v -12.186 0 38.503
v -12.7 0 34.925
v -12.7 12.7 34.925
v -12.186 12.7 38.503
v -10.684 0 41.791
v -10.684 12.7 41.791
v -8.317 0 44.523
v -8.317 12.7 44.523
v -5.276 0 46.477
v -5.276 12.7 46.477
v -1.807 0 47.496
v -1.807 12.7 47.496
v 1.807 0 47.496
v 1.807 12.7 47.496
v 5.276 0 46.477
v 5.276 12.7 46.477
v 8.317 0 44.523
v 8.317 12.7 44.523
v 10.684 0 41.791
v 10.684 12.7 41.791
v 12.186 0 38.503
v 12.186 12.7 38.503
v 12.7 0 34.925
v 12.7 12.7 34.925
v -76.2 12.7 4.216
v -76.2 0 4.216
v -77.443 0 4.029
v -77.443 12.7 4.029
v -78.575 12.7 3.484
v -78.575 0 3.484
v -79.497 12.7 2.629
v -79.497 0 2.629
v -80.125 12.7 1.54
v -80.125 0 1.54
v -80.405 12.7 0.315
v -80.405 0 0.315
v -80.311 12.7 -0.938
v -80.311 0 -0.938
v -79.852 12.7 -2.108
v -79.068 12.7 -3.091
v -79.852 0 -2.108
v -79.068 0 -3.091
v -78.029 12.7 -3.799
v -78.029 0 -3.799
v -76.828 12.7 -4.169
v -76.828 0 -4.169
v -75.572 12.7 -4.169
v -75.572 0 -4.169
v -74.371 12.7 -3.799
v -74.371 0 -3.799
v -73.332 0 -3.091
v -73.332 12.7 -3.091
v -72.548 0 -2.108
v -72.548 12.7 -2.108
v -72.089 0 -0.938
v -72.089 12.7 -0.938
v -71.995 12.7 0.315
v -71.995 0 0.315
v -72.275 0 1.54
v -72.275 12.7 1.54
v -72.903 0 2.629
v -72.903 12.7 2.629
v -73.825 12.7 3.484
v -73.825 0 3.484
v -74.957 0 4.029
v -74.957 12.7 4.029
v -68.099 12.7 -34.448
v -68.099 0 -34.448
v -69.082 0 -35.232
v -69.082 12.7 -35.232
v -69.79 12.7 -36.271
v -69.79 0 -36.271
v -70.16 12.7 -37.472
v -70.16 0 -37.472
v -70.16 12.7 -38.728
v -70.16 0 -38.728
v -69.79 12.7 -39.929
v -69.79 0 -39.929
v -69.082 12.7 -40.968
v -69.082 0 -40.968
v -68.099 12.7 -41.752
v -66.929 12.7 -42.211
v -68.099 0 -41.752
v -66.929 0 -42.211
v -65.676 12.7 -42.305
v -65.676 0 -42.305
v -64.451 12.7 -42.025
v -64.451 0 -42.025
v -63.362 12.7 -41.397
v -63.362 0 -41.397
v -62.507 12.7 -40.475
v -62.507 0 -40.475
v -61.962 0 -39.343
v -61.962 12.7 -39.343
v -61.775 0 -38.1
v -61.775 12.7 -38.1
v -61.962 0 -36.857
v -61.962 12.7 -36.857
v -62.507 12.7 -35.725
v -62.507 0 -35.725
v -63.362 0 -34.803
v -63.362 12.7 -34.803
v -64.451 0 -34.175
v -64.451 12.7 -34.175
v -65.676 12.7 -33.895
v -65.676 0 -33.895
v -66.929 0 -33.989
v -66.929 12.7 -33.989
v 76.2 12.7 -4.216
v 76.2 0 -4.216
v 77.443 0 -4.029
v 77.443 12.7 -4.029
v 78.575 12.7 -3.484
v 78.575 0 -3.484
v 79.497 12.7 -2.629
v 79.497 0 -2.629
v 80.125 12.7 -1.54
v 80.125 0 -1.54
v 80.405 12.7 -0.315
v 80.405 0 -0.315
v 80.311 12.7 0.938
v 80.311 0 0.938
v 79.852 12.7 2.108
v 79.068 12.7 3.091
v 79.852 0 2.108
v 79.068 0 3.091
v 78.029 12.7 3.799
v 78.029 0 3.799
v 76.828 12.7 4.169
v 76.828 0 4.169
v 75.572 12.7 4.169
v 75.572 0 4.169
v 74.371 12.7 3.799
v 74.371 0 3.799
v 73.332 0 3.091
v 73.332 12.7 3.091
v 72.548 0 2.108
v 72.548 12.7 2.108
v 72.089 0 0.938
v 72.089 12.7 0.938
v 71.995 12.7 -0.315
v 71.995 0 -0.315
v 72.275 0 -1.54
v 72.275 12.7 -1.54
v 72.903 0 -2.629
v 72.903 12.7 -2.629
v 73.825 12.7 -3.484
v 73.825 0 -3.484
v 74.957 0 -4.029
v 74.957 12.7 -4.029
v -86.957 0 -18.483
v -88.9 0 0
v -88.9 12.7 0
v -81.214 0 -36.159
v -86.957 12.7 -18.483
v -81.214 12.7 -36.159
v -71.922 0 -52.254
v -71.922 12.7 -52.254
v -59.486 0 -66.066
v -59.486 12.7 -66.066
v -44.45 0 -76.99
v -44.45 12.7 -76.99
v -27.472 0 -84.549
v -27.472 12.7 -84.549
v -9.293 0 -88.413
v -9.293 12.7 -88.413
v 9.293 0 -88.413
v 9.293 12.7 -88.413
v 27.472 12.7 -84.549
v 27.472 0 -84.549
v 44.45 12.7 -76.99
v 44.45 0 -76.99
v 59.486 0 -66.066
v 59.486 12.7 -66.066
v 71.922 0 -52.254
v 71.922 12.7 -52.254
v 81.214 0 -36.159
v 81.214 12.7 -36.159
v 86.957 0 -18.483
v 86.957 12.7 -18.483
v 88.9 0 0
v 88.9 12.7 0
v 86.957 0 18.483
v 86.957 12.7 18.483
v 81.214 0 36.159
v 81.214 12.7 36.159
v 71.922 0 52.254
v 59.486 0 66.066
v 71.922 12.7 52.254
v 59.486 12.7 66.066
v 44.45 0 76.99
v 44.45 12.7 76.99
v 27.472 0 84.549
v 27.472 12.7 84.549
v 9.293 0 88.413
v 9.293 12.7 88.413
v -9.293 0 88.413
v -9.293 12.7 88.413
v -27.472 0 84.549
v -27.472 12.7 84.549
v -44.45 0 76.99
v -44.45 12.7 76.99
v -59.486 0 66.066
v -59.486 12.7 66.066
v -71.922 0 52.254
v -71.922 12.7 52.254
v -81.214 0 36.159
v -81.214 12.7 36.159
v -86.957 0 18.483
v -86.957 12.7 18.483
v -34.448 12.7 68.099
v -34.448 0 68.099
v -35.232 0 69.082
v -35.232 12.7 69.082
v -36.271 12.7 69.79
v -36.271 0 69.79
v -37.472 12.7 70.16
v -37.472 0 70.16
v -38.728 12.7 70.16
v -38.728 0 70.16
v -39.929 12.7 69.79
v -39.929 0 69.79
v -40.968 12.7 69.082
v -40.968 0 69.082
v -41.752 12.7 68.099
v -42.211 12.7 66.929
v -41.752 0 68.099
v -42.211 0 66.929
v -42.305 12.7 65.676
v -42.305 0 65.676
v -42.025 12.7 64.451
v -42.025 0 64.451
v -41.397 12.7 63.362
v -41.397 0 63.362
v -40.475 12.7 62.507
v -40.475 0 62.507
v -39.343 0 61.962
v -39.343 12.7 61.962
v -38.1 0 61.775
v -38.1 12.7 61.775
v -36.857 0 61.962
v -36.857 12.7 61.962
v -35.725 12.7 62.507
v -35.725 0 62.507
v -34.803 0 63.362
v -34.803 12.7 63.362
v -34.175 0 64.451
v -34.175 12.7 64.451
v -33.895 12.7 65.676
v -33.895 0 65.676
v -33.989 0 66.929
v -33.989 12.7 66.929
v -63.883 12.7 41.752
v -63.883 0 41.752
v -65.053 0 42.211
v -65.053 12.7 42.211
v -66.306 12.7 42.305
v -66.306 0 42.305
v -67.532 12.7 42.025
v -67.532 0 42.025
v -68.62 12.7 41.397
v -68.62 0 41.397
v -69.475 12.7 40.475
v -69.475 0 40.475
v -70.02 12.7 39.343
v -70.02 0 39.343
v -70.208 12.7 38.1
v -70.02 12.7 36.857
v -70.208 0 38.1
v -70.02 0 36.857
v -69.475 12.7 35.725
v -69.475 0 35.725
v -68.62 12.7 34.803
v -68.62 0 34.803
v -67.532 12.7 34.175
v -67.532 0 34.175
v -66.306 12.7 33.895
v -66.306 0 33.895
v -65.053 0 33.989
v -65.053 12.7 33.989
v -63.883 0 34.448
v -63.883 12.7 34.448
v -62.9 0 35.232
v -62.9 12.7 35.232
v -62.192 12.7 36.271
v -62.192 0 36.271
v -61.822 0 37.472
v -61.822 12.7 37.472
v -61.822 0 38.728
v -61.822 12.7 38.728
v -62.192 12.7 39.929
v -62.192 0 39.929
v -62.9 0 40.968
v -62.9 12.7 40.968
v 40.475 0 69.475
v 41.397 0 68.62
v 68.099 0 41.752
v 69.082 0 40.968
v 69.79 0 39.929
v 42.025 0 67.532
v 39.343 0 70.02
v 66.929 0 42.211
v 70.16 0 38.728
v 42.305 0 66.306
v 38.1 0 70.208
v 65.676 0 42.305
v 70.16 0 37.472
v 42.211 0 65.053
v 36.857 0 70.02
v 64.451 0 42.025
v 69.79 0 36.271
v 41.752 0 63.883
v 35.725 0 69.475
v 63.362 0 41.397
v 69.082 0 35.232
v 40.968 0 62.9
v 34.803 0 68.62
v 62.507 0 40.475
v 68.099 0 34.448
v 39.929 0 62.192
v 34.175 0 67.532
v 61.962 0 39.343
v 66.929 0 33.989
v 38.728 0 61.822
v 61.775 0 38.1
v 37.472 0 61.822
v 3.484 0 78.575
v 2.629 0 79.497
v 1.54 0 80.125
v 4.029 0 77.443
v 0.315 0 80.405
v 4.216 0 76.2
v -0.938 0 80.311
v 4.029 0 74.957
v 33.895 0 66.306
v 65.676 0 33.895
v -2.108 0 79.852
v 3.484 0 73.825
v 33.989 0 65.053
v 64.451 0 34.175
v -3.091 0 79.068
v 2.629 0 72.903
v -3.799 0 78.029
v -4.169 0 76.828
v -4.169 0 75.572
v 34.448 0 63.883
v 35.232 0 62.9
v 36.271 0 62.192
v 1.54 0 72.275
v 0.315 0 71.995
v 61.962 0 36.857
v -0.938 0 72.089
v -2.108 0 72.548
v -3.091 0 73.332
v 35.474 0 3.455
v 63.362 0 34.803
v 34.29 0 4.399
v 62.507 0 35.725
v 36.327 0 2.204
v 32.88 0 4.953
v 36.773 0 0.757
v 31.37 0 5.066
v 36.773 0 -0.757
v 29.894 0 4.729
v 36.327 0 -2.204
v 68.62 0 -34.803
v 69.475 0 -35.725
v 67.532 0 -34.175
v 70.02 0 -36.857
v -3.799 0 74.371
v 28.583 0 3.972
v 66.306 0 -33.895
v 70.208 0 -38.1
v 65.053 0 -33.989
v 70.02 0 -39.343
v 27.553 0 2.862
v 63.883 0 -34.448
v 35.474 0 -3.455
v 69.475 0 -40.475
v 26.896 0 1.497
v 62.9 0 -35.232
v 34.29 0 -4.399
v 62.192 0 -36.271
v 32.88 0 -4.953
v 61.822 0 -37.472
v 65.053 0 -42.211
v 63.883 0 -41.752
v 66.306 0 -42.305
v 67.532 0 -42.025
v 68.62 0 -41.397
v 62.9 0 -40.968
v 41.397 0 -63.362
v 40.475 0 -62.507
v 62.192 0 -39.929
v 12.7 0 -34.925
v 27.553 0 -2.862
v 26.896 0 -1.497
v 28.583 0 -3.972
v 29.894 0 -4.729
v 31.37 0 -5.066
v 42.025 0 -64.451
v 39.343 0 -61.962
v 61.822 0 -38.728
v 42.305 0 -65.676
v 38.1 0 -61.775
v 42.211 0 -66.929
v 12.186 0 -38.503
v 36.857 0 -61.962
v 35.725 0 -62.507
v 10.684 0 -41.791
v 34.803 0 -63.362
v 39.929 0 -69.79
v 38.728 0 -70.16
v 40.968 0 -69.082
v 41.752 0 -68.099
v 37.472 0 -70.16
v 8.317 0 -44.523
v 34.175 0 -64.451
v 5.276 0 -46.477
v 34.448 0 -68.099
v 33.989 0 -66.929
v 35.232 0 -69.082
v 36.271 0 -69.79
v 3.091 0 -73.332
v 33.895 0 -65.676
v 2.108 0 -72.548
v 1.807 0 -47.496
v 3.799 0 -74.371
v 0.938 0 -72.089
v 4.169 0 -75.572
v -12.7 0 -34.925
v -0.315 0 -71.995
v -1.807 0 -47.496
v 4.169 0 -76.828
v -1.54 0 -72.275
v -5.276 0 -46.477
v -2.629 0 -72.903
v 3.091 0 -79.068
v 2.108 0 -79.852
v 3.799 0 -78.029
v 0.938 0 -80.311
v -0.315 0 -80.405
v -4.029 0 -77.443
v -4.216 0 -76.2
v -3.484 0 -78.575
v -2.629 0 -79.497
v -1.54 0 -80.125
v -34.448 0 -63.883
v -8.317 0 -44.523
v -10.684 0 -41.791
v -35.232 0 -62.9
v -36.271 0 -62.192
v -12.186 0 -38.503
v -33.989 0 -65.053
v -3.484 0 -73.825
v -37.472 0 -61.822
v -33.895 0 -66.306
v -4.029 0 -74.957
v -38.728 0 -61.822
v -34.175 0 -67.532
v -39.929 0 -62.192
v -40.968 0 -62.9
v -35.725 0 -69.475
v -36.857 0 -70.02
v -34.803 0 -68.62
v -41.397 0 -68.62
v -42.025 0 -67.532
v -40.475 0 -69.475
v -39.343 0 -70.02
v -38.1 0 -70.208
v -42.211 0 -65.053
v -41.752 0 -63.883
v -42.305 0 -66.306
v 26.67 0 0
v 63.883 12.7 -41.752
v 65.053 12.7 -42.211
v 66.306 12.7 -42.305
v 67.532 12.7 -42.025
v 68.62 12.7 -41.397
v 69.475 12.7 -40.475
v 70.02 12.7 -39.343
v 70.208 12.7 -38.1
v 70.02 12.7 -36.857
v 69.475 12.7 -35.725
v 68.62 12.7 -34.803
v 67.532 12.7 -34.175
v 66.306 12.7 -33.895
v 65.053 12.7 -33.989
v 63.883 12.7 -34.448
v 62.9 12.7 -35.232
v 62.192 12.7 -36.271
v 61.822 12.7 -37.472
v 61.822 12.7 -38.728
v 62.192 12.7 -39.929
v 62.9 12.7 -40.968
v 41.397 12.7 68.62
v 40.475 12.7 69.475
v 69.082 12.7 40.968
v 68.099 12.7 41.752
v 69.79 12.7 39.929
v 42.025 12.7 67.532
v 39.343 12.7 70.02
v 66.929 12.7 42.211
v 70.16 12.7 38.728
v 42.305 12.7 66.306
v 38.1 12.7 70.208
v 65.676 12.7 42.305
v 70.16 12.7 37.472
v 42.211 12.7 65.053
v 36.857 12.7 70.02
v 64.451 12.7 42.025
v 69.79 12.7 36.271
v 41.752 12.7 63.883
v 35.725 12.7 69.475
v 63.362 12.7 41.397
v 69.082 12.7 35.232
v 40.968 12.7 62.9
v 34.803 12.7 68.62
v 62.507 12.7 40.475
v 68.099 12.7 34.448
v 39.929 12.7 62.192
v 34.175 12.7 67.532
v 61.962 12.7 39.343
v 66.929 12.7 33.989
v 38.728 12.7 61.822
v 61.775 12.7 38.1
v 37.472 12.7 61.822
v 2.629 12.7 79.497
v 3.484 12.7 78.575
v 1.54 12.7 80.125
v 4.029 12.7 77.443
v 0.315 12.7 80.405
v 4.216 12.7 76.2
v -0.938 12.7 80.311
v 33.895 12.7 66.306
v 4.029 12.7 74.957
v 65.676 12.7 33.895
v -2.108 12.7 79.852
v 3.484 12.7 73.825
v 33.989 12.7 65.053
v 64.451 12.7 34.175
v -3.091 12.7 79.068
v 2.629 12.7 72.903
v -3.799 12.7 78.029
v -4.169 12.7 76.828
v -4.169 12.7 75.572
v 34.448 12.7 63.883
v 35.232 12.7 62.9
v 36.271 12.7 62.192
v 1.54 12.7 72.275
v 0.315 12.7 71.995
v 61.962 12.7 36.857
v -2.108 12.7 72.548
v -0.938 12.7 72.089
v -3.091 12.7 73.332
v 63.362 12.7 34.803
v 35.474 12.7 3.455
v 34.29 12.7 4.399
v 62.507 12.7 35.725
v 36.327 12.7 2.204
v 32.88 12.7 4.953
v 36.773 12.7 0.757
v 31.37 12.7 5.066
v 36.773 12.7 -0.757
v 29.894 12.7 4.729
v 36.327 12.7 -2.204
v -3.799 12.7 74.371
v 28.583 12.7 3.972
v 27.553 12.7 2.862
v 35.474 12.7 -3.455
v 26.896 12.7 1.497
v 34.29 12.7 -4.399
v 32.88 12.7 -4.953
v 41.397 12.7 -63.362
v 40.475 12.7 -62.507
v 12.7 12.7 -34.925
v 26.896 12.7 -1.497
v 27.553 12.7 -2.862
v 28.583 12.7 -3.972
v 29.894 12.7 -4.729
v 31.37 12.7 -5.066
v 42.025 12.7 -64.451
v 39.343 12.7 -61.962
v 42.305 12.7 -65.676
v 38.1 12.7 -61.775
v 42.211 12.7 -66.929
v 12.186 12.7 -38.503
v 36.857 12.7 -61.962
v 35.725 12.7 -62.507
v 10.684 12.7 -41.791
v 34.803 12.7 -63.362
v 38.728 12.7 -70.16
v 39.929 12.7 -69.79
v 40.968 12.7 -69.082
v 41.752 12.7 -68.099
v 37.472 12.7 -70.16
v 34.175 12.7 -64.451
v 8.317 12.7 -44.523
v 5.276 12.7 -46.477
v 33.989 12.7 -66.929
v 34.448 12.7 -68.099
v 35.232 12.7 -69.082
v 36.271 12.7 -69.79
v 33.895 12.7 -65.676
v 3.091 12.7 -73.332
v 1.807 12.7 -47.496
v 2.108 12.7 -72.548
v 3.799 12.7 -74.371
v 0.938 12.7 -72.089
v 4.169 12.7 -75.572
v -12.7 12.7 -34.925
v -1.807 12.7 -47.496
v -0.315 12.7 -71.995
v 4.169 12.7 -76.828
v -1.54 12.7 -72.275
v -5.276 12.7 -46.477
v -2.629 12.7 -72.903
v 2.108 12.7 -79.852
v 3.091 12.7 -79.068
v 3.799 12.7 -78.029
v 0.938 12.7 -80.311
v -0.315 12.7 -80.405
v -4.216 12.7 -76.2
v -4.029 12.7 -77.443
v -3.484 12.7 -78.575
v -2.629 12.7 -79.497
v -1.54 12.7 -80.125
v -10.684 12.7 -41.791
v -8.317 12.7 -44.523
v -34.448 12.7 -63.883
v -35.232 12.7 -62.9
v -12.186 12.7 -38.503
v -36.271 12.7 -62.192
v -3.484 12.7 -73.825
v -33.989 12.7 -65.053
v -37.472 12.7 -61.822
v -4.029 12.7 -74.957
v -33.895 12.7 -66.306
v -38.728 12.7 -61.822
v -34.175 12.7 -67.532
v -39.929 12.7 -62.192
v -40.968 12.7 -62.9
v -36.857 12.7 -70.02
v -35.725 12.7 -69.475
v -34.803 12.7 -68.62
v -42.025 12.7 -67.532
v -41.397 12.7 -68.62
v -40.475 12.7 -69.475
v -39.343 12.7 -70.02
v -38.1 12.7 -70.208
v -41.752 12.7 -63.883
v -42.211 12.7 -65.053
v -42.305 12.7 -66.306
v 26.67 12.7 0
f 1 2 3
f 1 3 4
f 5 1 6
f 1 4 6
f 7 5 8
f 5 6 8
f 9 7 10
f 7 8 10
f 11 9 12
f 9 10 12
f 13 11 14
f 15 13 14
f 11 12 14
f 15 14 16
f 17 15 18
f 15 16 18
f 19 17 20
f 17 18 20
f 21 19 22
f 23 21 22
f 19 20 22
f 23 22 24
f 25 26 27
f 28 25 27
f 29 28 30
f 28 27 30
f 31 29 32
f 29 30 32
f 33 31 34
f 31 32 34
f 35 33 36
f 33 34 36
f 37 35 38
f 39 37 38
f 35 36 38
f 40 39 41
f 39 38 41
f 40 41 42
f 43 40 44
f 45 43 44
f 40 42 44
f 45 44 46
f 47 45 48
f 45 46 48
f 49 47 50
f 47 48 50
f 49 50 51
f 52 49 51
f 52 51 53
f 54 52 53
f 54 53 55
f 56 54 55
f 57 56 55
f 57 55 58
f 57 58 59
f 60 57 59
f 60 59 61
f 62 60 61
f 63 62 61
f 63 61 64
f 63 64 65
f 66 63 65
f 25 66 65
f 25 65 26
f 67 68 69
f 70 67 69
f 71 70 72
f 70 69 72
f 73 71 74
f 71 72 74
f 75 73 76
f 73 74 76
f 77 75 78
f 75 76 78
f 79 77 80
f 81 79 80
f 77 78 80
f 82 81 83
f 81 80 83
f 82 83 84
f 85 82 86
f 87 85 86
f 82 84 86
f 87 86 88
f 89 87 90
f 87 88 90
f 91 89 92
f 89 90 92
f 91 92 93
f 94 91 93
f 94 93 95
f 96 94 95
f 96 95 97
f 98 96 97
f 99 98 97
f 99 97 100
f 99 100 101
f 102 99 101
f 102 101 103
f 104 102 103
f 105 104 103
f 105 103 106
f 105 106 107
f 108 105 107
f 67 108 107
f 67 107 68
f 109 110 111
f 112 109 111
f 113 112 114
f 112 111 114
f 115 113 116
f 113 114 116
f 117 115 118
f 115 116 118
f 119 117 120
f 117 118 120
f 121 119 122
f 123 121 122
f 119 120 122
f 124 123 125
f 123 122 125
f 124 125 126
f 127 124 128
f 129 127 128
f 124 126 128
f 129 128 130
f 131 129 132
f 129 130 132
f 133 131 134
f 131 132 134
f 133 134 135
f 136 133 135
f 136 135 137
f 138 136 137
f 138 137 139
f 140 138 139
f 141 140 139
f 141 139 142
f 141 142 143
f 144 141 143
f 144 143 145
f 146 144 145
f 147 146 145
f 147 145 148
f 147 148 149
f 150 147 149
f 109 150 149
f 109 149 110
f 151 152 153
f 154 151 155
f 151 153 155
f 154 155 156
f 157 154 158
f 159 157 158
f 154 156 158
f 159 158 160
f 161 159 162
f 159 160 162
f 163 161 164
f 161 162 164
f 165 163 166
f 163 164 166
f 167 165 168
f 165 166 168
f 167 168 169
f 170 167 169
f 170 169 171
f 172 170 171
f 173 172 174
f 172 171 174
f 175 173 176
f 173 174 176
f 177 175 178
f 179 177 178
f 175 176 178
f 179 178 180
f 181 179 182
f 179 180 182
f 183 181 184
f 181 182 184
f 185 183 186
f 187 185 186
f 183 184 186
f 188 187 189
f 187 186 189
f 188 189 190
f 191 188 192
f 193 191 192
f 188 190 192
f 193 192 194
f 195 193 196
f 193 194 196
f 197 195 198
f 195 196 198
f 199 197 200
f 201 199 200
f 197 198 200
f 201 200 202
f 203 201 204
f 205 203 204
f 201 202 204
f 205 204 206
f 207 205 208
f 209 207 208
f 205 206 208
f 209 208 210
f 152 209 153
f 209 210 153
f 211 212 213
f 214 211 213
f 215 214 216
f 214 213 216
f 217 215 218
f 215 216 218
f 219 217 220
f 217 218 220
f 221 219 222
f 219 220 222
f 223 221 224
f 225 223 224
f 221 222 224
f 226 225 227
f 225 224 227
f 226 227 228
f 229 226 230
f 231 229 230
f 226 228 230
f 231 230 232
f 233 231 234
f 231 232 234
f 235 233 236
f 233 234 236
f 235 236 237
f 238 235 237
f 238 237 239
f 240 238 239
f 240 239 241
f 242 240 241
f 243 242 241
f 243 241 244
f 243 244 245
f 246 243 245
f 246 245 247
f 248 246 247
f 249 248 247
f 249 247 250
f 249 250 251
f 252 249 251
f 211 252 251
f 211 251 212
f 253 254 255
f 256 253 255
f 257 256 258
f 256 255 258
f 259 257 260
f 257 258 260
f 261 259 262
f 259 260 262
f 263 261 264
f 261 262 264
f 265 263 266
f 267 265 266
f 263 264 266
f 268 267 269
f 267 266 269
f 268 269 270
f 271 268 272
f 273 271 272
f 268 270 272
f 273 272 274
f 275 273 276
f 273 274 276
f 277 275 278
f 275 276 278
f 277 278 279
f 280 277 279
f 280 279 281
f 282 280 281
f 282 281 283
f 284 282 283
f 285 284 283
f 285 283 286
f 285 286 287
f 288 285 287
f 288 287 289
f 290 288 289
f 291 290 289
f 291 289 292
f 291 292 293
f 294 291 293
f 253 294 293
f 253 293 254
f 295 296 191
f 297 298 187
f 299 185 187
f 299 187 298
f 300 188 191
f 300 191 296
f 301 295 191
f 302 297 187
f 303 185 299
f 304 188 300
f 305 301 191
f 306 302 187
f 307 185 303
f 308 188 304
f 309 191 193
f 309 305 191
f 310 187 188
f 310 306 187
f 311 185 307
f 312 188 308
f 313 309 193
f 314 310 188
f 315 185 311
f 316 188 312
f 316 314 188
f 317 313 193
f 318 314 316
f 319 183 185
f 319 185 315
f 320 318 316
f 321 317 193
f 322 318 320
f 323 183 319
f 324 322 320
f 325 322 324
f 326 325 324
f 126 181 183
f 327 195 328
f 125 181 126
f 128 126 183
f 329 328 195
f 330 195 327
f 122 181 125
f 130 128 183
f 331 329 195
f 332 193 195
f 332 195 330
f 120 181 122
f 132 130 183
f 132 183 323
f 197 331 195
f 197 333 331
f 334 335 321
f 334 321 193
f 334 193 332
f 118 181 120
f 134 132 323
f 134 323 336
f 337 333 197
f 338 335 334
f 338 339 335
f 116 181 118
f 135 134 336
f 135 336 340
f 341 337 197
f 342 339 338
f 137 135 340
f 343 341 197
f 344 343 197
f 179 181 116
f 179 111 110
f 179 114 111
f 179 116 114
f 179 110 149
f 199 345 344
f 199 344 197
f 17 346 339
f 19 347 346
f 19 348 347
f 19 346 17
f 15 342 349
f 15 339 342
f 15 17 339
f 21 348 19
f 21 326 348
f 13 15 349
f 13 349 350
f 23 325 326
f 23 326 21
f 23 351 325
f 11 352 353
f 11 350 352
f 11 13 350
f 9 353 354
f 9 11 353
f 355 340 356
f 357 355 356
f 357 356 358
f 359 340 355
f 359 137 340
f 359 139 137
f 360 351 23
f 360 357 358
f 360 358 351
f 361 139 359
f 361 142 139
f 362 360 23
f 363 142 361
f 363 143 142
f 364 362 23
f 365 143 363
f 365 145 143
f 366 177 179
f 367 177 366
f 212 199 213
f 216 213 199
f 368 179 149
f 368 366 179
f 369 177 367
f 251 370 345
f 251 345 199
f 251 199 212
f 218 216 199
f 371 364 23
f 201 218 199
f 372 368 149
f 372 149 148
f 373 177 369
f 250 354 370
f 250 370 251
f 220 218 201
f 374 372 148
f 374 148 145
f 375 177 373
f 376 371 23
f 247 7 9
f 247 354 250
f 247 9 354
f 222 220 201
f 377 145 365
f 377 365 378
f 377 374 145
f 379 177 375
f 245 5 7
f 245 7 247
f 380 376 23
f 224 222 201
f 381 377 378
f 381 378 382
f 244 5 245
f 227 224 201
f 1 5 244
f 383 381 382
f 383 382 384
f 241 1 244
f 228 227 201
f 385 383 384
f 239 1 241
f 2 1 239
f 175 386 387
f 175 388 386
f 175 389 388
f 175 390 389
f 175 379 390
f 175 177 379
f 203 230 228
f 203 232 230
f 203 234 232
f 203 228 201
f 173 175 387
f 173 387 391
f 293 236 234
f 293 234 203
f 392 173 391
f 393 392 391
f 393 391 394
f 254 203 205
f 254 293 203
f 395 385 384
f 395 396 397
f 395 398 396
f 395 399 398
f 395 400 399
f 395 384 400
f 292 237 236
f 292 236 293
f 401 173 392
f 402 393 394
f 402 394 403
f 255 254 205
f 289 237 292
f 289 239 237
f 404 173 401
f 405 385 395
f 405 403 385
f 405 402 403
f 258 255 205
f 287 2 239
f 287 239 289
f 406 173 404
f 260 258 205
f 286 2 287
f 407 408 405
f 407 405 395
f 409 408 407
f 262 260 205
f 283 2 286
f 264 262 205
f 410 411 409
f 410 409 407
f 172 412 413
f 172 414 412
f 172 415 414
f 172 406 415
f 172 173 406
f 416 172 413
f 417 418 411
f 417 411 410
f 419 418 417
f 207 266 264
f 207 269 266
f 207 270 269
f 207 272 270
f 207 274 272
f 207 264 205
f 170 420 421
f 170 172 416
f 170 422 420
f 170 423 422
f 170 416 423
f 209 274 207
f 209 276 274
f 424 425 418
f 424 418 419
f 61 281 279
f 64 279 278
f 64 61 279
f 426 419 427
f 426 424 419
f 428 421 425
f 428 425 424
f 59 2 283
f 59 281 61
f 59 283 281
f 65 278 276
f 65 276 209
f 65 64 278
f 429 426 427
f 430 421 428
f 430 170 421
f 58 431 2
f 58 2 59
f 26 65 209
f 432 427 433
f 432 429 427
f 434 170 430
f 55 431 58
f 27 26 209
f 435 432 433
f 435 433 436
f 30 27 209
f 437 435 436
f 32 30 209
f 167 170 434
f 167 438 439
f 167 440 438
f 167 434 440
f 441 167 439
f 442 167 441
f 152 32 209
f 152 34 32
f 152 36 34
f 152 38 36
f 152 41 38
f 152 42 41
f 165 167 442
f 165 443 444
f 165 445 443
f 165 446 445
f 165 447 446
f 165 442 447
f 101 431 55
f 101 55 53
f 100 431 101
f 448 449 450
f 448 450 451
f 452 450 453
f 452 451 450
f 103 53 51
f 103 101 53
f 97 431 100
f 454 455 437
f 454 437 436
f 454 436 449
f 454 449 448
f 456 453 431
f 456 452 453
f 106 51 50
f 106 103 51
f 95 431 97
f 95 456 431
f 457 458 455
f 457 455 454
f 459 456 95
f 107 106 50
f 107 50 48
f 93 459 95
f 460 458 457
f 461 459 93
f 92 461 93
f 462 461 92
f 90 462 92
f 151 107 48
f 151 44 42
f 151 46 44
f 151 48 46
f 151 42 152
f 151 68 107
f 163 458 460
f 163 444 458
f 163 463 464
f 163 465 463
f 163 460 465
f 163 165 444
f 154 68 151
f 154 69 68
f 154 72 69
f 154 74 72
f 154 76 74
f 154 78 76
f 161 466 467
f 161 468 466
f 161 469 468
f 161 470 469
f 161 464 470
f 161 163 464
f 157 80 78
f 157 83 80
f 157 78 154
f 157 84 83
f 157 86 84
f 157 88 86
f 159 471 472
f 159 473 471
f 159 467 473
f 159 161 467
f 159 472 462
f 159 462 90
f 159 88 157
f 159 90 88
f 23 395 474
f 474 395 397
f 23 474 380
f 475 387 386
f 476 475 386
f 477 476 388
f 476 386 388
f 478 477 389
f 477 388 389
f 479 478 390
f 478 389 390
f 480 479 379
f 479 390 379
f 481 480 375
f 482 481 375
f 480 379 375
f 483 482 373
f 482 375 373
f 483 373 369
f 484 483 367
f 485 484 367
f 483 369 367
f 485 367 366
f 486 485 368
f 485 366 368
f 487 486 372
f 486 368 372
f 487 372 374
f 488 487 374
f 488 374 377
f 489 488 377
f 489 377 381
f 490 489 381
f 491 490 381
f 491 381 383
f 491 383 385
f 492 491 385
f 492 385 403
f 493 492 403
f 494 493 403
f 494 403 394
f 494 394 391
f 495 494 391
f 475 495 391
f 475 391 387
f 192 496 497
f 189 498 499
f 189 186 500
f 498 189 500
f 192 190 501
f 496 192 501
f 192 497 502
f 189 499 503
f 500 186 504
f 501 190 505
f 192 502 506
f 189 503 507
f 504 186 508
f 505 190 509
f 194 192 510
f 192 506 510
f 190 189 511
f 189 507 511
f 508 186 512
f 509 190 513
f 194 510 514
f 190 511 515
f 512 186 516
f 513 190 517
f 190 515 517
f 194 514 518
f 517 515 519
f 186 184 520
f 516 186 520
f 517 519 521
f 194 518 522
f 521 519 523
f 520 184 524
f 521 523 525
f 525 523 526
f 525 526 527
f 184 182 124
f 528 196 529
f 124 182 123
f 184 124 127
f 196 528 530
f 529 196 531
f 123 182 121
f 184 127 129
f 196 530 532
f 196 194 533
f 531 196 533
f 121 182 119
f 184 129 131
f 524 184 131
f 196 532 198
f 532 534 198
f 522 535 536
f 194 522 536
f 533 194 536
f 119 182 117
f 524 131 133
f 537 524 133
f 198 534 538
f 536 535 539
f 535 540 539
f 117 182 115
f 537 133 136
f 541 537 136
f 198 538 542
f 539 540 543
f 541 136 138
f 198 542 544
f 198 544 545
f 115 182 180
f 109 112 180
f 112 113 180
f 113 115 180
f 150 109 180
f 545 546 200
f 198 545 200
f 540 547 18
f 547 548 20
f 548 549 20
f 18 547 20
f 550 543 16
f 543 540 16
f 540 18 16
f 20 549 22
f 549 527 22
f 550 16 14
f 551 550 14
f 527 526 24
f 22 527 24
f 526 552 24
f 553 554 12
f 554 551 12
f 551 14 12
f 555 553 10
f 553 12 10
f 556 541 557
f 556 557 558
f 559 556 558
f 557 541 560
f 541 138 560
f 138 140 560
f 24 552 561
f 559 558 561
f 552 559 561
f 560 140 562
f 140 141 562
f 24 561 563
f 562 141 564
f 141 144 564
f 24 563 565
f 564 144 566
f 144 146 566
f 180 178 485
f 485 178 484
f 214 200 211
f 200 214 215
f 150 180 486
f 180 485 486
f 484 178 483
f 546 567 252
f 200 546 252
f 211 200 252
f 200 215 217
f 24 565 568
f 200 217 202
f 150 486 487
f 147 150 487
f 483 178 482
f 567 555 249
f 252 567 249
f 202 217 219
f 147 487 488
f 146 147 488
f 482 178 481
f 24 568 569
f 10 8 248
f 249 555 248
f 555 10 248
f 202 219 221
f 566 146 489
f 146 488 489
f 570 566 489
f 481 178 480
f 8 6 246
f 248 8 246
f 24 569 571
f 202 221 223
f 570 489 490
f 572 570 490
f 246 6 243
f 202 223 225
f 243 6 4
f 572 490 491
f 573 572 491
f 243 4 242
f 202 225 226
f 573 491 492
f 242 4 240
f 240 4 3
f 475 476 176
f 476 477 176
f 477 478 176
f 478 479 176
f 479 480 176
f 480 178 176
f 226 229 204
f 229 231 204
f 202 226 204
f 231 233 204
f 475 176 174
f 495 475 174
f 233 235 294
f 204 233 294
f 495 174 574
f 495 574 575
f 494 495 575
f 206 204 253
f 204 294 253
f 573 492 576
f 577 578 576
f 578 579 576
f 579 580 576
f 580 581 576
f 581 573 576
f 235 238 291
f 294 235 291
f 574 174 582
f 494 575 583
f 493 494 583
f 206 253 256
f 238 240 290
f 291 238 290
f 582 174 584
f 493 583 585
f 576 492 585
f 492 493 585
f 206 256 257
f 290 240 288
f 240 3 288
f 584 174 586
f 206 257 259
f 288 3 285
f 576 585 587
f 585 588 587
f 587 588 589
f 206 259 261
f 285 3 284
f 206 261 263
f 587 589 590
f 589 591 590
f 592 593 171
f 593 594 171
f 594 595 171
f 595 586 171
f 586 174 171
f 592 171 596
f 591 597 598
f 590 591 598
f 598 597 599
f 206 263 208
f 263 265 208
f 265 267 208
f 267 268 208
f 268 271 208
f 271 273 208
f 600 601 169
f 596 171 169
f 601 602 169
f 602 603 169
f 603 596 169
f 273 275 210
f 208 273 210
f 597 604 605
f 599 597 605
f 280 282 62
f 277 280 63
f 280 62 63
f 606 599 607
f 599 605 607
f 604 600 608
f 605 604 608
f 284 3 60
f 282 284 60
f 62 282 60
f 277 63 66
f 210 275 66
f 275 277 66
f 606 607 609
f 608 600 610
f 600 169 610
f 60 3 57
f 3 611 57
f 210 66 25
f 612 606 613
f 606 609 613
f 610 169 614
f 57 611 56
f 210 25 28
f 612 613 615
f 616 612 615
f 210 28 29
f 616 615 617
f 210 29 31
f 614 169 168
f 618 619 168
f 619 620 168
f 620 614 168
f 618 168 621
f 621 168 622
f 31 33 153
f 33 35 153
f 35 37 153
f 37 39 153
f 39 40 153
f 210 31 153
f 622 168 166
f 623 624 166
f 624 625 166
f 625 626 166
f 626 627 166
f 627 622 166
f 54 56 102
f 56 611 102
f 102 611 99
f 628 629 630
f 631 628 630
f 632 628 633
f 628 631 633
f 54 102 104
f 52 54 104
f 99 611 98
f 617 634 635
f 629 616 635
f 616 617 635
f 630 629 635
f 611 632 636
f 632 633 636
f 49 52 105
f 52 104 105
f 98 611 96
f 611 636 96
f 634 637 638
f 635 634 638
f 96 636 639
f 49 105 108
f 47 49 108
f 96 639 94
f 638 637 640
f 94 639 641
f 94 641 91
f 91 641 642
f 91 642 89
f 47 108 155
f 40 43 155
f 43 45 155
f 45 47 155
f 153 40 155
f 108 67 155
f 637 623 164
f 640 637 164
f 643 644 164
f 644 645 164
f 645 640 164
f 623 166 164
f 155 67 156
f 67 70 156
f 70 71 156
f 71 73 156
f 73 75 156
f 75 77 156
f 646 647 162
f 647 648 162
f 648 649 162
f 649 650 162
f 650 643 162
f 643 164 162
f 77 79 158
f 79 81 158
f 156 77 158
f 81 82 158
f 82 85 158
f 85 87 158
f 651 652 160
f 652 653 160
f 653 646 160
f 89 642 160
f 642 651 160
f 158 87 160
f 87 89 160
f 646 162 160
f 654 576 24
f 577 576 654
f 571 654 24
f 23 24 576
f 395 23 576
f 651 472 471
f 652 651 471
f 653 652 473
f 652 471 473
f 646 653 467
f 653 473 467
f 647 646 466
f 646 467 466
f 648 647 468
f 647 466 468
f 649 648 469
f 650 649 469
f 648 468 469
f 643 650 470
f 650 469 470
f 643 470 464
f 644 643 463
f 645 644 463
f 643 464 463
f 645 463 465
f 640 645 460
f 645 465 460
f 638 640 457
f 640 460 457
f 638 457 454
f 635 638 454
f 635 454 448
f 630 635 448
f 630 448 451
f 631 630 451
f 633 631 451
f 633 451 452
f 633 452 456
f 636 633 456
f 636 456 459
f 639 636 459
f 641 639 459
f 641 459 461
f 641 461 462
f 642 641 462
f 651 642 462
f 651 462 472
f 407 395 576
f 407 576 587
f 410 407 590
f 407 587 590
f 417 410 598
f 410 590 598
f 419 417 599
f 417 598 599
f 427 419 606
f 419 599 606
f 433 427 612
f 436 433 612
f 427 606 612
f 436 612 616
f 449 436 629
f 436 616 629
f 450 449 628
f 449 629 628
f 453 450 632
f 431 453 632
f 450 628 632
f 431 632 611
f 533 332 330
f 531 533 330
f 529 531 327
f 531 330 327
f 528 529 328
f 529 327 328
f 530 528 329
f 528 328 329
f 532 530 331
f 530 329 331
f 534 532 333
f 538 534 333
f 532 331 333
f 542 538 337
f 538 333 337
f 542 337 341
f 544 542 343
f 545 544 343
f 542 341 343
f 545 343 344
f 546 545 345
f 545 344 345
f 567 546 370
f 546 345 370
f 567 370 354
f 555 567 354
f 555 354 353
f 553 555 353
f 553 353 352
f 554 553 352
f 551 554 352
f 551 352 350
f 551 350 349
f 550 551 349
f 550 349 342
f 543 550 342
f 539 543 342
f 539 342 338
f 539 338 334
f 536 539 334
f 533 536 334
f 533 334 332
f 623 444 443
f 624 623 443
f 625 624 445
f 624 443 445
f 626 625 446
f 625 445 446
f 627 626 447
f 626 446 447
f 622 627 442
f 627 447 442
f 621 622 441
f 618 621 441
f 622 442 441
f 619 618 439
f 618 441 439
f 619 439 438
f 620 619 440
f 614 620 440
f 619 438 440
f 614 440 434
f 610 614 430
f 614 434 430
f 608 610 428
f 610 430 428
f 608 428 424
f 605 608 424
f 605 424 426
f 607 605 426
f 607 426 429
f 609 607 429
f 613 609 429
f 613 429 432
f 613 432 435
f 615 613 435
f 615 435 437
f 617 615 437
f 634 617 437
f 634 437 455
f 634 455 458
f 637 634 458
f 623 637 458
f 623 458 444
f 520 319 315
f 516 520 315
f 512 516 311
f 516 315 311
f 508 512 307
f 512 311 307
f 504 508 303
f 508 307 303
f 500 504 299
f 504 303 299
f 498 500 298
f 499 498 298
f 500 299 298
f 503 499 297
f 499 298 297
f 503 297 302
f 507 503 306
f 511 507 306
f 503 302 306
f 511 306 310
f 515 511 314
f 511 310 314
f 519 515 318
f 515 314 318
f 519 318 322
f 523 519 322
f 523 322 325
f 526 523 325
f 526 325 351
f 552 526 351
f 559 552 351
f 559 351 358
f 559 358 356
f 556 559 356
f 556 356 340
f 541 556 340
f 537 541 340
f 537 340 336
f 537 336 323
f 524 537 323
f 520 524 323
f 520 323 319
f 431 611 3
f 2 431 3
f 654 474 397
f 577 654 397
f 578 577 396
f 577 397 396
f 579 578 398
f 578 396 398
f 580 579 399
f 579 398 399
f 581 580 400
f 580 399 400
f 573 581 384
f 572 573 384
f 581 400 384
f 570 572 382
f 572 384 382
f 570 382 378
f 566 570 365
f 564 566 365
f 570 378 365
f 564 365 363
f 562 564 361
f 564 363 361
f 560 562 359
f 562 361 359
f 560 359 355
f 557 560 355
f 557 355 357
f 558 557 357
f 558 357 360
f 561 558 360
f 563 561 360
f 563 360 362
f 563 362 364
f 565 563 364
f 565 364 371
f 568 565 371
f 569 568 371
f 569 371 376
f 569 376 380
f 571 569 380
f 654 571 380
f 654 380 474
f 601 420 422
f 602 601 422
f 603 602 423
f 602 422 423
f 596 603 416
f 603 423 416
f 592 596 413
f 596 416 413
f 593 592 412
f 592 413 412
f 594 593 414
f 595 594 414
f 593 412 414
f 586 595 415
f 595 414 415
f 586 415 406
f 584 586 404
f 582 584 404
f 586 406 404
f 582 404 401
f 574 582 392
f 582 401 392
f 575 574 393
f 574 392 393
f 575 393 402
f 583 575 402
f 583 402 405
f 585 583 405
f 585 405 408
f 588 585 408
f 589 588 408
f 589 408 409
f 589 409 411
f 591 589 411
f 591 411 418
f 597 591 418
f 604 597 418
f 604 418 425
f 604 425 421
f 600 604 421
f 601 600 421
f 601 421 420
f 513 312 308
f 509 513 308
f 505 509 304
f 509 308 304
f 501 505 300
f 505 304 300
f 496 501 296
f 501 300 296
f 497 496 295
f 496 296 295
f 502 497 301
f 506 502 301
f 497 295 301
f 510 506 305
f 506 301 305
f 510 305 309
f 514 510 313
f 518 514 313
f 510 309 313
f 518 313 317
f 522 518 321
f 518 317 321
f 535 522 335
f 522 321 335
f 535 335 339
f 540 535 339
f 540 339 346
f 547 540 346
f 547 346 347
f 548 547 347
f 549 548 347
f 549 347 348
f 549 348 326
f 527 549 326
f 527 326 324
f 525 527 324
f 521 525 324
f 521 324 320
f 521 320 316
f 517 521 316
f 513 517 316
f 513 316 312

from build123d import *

# Parameters (mm, degrees)
SKETCH2_W                = 88.9
SKETCH2_H                = 12.7
CUT_EXTRUDE1_DEPTH       = 127.363404513
F_5_16_CLEARANCE_HOLE1_D = 8.4328
CIRPATTERN1_COUNT        = 12
F_5_16_CLEARANCE_HOLE2_D = 10.16


with BuildPart() as part:
    # Sketch2 → Revolve1 (revolve)
    with BuildSketch(Plane.XY):
        with Locations((-44.45, 6.35)):
            Rectangle(SKETCH2_W, SKETCH2_H)
    revolve(axis=Axis((0, 12.7, 0), (0, -1, 0)))

    # Sketch3 → Cut-Extrude1 (cut, through all)
    with BuildSketch(Plane(origin=(0, 12.7, 0), x_dir=(1, 0, 0), z_dir=(0, 1, 0))):
        with BuildLine():
            Line((-12.7, 34.925), (-12.7, -34.925))
            ThreePointArc((-12.7, -34.925), (0, -47.625), (12.7, -34.925))
            Line((12.7, -34.925), (12.7, 34.925))
            ThreePointArc((12.7, 34.925), (0, 47.625), (-12.7, 34.925))
        make_face()
    extrude(amount=-CUT_EXTRUDE1_DEPTH, mode=Mode.SUBTRACT)

    # 5/16 Clearance Hole1 (through all)
    with Locations(Plane(origin=(0, 12.7, 0), x_dir=(1, 0, 0), z_dir=(0, 1, 0))):
        with Locations((0, 76.2)):
            f_5_16_clearance_hole1 = Hole(F_5_16_CLEARANCE_HOLE1_D / 2)

    # CirPattern1: 5/16 Clearance Hole1 ×12 about axis
    cirpattern1_axis = Axis((0, 13.335, 0), (0, -1, 0))
    for i in range(1, CIRPATTERN1_COUNT):
        add(f_5_16_clearance_hole1.rotate(cirpattern1_axis, i * 360 / CIRPATTERN1_COUNT), mode=Mode.SUBTRACT)

    # 5/16 Clearance Hole2 (through all)
    with Locations(Plane(origin=(0, 12.7, 0), x_dir=(1, 0, 0), z_dir=(0, 1, 0))):
        with Locations((31.75, 0)):
            Hole(F_5_16_CLEARANCE_HOLE2_D / 2)


solid = part.part
